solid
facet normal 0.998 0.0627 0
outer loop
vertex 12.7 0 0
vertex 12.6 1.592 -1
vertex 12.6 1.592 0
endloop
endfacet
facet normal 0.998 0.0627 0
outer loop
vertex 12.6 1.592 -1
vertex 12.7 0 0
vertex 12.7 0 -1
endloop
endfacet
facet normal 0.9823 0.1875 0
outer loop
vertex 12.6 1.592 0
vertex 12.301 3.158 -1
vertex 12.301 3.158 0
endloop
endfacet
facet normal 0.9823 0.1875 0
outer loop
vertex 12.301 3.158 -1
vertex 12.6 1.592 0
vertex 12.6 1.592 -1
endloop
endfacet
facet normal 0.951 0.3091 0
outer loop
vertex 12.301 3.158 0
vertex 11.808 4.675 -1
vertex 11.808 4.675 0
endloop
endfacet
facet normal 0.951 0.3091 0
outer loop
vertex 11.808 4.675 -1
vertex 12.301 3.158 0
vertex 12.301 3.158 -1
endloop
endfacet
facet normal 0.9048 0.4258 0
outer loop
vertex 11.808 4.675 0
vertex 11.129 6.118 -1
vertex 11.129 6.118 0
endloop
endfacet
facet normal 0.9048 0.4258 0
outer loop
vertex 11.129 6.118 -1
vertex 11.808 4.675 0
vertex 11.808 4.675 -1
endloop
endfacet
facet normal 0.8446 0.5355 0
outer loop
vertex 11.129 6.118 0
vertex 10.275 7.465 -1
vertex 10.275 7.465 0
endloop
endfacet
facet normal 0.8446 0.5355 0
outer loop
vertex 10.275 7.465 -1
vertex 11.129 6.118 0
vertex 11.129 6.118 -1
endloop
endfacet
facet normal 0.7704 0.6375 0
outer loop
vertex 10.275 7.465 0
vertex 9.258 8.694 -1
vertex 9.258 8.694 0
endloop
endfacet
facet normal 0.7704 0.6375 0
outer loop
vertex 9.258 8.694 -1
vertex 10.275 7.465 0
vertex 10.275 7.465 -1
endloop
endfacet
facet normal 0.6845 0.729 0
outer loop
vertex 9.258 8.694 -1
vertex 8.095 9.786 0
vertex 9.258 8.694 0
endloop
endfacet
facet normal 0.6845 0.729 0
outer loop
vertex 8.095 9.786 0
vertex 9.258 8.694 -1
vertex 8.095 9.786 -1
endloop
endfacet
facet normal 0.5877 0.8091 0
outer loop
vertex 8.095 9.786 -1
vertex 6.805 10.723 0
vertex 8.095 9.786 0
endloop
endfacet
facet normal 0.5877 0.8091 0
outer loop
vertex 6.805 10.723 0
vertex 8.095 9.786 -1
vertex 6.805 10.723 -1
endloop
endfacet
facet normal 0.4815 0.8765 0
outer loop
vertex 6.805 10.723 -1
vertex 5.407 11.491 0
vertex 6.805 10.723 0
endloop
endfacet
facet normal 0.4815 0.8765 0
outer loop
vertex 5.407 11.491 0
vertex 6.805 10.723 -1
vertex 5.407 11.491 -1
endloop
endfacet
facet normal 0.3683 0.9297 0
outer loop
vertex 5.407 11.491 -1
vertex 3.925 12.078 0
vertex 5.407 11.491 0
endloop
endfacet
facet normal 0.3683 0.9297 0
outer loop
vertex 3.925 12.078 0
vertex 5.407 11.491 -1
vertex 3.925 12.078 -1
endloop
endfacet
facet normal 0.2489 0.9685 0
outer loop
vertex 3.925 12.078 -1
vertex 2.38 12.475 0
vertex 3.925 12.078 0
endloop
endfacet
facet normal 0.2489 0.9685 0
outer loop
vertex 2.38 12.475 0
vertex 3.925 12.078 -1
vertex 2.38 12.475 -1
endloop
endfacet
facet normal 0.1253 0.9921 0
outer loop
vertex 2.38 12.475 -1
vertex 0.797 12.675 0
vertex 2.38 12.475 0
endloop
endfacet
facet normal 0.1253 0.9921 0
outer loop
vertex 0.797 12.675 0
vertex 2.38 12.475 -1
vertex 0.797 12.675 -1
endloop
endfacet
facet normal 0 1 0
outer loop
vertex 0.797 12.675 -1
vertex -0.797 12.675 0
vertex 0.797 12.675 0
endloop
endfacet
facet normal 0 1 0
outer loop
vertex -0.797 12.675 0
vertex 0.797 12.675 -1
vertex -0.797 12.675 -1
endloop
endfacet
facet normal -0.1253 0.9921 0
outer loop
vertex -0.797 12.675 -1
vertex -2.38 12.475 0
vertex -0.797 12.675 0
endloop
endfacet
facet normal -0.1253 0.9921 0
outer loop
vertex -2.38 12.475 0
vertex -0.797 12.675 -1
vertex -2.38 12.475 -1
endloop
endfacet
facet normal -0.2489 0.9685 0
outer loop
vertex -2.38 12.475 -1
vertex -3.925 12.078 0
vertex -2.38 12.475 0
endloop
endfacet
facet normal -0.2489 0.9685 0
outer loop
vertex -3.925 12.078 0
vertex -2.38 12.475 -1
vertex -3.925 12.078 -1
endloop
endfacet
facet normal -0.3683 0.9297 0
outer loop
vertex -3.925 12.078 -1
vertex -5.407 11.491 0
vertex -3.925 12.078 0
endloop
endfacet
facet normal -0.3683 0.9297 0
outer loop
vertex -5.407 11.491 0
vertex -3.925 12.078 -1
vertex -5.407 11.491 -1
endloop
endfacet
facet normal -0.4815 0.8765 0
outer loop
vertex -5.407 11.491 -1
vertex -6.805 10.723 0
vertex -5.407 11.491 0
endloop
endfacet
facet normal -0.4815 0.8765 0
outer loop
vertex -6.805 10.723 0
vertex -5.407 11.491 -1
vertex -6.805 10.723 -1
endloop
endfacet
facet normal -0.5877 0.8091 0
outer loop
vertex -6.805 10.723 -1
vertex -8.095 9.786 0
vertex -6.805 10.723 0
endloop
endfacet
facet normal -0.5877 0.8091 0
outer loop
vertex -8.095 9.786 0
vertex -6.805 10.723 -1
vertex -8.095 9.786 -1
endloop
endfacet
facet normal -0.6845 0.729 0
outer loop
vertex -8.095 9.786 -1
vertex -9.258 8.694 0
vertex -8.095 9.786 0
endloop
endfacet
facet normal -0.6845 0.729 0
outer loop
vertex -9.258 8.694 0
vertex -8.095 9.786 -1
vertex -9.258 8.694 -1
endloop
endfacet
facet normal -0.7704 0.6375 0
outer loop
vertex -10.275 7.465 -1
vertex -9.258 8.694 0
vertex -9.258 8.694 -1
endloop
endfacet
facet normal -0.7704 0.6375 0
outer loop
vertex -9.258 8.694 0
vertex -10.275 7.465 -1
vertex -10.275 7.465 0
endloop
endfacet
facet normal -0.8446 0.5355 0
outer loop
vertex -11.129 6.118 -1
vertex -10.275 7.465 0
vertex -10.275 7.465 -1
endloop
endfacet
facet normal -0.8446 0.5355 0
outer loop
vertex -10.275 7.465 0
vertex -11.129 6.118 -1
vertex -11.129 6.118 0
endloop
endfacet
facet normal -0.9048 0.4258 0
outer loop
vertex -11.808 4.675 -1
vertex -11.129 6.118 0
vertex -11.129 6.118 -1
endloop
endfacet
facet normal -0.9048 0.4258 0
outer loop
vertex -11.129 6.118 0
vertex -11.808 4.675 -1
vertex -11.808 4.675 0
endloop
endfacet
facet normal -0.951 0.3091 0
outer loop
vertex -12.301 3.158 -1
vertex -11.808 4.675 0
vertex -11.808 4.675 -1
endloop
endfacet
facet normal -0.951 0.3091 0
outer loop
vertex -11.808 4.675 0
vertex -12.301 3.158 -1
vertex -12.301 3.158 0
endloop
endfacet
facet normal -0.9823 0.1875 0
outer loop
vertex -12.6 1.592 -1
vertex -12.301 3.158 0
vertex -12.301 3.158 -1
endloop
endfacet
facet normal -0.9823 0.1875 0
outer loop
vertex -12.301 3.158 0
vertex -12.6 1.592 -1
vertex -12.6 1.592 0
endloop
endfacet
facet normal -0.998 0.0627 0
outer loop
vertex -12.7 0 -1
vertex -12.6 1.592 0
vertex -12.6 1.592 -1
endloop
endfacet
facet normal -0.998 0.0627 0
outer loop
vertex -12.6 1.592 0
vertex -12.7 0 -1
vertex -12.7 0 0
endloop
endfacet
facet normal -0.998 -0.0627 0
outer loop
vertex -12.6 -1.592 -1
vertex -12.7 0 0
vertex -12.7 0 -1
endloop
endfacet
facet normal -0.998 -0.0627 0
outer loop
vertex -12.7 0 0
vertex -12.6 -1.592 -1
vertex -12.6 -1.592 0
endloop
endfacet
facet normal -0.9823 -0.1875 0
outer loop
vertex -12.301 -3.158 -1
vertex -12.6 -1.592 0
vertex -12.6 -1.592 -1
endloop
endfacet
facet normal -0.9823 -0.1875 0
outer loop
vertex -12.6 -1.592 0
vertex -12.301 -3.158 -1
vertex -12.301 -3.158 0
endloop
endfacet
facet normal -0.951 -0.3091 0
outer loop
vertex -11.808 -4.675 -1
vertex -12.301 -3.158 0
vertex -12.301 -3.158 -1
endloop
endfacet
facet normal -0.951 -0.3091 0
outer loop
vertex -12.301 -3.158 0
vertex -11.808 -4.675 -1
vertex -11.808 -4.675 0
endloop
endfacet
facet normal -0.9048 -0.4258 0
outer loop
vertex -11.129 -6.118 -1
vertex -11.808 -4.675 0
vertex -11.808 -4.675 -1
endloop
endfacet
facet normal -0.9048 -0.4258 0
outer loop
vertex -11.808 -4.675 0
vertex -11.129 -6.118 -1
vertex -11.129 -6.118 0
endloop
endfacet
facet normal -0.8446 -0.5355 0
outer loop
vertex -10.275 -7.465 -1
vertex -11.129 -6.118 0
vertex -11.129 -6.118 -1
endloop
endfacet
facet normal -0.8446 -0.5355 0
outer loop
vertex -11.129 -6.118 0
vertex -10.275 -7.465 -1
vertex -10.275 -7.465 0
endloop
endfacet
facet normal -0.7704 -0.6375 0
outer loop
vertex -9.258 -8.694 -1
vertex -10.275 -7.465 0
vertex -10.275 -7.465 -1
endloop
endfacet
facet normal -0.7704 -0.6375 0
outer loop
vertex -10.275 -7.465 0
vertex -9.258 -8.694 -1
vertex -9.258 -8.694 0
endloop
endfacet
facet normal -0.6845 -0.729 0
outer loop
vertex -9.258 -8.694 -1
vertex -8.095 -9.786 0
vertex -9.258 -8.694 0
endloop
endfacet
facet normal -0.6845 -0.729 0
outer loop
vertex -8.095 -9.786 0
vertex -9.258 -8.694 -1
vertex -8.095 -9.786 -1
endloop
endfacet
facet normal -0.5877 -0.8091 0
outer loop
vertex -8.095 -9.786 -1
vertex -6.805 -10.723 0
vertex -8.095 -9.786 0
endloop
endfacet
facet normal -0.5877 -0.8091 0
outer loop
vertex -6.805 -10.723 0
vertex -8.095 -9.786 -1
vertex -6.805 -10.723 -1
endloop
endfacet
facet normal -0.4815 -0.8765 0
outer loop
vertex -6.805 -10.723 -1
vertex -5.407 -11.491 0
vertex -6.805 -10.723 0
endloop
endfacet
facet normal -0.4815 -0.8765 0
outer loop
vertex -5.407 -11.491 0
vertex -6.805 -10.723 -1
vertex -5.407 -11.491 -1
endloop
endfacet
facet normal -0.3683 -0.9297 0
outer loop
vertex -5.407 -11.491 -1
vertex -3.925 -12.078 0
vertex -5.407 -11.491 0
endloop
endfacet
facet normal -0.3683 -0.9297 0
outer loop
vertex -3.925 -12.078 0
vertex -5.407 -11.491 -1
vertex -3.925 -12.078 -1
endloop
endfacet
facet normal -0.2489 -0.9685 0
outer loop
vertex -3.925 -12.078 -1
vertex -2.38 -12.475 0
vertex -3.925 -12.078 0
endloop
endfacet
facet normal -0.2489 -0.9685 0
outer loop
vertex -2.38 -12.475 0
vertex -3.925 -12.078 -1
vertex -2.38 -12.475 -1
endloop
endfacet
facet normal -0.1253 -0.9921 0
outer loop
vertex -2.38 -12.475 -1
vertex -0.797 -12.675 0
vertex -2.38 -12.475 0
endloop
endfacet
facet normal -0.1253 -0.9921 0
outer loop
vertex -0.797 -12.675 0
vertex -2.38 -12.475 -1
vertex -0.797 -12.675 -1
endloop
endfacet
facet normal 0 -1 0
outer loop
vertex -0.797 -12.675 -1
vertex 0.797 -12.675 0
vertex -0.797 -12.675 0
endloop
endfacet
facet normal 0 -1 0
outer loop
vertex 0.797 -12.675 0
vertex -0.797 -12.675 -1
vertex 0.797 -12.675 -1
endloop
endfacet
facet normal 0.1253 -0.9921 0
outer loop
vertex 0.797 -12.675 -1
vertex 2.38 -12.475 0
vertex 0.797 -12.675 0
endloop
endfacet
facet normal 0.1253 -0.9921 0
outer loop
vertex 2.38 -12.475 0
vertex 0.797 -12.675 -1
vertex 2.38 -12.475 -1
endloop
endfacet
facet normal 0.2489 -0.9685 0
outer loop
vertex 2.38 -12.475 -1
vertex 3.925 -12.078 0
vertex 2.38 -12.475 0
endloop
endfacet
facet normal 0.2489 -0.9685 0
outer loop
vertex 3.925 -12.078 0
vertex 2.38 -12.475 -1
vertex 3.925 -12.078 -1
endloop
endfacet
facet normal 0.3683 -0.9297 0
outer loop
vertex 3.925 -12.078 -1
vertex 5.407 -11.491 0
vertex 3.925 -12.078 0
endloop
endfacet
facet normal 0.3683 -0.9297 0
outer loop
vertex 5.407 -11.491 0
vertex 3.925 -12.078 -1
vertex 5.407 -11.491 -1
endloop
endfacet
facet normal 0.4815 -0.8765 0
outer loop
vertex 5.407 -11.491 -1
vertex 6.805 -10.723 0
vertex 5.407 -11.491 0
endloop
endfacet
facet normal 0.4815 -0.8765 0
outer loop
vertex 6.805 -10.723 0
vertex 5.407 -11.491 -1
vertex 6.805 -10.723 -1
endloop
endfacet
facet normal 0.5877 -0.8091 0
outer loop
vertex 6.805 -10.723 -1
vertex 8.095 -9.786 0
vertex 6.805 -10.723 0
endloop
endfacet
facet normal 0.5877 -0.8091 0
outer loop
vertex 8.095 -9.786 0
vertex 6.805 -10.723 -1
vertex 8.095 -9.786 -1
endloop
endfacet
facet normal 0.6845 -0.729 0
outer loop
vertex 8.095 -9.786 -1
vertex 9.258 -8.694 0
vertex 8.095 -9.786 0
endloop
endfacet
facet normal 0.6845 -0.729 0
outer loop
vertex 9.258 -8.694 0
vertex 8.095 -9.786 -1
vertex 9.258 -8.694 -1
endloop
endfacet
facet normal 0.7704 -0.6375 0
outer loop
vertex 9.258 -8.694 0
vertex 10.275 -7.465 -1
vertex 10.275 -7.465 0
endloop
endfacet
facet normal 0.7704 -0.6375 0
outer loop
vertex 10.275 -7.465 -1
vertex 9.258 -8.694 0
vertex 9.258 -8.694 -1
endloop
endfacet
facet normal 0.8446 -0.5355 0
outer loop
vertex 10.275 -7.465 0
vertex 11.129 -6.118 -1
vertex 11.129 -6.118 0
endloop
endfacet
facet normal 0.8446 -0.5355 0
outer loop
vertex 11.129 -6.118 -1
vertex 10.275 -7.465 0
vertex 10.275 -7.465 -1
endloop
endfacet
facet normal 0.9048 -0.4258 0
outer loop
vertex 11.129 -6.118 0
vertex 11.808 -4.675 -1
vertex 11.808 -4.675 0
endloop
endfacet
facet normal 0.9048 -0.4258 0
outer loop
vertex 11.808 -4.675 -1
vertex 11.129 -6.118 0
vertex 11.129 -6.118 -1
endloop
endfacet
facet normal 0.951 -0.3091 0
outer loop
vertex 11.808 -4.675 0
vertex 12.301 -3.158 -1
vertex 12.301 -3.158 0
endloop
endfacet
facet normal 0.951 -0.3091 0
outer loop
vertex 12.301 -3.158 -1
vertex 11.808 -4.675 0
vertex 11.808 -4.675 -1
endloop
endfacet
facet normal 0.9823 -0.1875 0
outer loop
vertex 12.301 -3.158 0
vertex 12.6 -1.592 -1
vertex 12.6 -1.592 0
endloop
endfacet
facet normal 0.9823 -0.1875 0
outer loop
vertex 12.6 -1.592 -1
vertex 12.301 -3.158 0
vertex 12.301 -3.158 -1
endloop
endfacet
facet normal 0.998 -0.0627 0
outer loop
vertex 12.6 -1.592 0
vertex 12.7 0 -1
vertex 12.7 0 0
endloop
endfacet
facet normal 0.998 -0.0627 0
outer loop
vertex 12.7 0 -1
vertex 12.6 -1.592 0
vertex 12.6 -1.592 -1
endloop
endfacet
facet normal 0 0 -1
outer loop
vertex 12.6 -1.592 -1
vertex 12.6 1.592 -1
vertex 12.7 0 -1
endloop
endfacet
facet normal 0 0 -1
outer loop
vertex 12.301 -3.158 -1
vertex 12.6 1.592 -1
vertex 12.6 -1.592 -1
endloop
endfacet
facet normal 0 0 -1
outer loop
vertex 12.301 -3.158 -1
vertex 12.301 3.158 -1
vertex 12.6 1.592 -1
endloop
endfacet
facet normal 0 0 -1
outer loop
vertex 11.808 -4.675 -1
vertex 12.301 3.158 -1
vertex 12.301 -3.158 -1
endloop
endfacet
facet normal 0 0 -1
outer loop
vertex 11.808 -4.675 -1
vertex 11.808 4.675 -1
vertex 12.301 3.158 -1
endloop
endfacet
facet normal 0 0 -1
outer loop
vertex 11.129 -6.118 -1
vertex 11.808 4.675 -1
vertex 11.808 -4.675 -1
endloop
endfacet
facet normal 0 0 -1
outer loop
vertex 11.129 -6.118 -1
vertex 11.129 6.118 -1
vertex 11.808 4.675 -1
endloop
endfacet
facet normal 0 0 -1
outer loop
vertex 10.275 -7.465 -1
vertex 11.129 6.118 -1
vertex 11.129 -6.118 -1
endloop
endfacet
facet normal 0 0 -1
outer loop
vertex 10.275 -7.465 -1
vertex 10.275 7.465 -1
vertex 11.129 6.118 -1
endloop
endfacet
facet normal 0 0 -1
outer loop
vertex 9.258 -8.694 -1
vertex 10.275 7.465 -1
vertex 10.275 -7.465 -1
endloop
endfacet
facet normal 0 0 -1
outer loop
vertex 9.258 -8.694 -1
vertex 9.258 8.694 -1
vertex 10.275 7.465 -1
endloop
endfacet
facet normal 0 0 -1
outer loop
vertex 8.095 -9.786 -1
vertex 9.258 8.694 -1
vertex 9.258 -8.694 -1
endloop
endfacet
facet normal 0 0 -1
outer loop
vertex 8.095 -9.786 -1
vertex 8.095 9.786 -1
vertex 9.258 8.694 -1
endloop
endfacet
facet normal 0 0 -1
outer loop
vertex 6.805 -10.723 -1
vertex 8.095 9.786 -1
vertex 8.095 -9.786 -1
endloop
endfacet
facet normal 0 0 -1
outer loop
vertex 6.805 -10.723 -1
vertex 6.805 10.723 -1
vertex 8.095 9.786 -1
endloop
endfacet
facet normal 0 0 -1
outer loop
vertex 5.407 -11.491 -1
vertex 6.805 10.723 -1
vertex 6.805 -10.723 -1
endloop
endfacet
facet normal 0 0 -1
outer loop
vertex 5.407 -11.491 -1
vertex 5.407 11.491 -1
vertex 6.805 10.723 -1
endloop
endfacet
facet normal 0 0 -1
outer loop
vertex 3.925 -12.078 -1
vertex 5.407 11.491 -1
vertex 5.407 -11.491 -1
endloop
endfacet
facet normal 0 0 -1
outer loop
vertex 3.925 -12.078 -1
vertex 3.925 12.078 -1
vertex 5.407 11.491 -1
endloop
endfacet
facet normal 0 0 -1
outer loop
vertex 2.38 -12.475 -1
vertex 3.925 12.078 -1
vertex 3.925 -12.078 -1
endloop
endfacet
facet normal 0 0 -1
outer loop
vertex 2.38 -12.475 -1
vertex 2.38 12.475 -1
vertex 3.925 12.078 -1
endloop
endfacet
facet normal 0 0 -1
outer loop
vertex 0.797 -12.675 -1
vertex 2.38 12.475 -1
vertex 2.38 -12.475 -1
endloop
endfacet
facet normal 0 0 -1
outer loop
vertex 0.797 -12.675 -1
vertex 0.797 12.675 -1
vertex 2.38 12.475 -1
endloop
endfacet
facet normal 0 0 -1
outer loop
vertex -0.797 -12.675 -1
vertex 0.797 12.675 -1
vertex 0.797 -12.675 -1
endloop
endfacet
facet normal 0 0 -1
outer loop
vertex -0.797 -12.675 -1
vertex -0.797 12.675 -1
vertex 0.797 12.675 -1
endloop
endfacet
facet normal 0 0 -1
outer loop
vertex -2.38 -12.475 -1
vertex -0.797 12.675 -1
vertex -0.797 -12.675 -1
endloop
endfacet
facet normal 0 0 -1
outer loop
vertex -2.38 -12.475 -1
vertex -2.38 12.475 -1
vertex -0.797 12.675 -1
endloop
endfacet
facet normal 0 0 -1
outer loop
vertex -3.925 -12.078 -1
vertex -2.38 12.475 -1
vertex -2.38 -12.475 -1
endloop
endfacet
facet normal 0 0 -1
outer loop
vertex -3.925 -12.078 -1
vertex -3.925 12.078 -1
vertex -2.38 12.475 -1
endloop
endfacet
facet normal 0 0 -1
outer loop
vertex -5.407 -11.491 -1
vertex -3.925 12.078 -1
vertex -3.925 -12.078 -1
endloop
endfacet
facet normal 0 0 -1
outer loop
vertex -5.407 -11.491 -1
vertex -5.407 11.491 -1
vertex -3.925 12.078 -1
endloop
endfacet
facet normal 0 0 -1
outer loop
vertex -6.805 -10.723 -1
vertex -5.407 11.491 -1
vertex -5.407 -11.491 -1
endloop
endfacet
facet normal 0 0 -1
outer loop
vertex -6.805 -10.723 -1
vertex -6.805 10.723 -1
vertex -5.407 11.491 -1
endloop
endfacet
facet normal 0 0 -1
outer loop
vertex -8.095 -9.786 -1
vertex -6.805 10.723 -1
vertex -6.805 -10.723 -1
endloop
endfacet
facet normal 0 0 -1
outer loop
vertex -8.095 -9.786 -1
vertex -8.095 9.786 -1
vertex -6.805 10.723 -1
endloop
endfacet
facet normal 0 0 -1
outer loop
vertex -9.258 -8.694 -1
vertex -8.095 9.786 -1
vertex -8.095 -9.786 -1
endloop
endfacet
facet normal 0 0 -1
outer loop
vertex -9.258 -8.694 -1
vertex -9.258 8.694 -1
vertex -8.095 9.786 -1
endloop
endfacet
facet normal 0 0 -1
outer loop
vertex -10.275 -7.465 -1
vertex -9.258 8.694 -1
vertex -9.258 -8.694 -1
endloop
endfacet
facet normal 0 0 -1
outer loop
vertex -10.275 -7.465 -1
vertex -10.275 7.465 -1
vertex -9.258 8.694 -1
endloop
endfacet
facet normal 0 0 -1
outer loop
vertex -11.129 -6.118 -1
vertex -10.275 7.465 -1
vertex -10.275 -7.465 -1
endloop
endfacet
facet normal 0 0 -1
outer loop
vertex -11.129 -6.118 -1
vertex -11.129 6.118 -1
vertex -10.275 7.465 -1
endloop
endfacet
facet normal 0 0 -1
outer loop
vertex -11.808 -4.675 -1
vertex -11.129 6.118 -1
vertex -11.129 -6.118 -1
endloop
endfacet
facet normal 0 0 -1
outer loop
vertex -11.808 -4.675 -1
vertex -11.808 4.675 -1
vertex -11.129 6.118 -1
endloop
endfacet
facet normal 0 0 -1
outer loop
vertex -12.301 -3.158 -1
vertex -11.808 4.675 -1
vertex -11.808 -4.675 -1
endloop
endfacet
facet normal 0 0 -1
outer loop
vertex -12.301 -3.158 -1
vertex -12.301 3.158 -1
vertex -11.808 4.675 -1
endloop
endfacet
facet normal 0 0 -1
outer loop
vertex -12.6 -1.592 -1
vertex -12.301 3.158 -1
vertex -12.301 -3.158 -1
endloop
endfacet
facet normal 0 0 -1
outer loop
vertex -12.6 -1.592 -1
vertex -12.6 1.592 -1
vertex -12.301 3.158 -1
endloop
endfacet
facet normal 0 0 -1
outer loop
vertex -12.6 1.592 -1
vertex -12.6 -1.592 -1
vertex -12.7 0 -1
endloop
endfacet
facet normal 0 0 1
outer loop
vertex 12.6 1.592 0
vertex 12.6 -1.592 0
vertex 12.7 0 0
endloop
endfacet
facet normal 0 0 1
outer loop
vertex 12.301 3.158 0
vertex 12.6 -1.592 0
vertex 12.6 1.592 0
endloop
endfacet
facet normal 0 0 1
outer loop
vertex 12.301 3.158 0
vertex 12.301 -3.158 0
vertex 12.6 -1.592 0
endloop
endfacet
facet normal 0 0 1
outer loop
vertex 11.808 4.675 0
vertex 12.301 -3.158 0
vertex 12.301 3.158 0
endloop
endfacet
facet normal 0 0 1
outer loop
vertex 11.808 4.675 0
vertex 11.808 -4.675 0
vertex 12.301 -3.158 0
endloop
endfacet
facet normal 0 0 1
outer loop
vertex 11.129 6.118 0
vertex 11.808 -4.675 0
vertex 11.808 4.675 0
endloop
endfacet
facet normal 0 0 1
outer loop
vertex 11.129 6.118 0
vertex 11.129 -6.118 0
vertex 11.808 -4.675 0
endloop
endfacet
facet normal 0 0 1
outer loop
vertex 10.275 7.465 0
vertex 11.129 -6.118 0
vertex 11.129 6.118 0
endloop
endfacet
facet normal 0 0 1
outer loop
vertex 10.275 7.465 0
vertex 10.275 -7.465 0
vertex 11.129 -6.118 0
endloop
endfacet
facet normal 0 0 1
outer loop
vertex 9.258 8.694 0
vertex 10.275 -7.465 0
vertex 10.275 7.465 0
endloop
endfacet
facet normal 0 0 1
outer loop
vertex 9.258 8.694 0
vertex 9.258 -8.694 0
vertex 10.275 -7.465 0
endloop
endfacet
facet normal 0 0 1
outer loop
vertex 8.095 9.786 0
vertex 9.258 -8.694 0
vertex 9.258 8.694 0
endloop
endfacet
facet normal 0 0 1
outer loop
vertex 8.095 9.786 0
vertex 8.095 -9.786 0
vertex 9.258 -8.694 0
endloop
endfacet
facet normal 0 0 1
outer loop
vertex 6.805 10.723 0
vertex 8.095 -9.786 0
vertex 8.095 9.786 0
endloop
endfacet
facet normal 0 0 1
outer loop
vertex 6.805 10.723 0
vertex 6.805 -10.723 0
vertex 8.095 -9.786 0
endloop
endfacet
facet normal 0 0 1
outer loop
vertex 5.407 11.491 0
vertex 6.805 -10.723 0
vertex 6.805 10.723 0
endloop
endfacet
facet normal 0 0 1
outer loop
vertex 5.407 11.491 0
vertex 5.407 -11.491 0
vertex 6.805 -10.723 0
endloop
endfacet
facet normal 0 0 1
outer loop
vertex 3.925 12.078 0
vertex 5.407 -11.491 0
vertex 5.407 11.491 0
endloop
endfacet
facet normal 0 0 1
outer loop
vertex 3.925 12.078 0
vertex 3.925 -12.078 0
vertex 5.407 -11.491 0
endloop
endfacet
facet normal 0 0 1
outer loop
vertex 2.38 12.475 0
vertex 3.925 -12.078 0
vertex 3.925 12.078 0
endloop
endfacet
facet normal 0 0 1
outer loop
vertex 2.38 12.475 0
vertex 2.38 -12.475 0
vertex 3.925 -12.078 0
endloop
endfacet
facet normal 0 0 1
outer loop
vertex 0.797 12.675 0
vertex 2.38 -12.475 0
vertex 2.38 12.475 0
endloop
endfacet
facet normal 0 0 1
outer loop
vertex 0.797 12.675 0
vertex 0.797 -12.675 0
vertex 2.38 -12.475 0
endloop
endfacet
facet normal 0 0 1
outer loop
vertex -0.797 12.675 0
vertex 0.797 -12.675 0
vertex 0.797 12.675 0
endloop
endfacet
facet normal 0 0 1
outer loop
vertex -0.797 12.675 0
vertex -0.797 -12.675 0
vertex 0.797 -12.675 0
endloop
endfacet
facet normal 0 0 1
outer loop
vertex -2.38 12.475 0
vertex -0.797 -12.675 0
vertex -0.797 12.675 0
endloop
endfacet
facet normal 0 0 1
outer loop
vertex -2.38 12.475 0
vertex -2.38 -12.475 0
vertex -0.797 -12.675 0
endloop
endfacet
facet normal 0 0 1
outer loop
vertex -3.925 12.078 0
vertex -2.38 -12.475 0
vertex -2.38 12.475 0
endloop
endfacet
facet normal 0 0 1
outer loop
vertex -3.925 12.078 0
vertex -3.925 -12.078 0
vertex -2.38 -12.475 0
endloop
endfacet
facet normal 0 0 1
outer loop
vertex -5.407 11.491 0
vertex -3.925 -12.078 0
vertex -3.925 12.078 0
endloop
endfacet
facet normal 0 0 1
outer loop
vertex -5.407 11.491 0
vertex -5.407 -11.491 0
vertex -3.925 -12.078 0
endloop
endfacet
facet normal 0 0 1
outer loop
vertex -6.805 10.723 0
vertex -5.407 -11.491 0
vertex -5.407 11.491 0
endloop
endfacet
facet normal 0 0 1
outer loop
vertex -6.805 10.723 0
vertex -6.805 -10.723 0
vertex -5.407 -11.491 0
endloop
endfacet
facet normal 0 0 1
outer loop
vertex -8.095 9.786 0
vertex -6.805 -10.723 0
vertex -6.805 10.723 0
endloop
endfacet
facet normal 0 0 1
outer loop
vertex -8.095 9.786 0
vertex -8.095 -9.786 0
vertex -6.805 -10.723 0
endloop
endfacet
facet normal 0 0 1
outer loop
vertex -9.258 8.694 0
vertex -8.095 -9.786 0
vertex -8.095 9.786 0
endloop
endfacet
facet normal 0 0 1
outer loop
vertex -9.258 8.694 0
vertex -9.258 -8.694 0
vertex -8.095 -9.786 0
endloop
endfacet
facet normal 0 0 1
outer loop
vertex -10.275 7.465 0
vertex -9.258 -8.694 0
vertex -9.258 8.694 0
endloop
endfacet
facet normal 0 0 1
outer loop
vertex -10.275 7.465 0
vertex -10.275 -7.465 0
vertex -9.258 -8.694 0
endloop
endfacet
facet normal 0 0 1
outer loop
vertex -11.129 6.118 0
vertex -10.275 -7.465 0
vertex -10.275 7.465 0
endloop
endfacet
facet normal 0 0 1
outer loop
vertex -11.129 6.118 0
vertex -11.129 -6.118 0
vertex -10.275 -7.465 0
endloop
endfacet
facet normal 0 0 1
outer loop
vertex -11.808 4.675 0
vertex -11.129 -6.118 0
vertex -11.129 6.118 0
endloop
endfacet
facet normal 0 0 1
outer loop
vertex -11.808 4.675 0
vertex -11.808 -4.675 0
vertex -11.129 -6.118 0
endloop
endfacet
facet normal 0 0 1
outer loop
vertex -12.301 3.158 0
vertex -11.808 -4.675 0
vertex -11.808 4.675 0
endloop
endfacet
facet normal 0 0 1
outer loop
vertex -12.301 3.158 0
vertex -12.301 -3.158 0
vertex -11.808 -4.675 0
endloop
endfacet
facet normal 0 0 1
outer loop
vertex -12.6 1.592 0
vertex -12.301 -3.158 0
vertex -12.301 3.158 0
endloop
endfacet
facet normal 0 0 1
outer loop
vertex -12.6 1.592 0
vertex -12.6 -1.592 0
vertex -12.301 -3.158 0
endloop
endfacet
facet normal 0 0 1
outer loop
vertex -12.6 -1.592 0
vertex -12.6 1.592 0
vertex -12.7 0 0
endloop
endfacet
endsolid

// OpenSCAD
scale(.45){
	intersection(){
		scale([.1, .1, 0.02]) surface(file = "pluto.png", center = true, invert = false);
		cylinder(r=28, h=10);
	}
}

translate([0,0,-1]) cylinder(d=25.4, h=1, $fn=50 );
